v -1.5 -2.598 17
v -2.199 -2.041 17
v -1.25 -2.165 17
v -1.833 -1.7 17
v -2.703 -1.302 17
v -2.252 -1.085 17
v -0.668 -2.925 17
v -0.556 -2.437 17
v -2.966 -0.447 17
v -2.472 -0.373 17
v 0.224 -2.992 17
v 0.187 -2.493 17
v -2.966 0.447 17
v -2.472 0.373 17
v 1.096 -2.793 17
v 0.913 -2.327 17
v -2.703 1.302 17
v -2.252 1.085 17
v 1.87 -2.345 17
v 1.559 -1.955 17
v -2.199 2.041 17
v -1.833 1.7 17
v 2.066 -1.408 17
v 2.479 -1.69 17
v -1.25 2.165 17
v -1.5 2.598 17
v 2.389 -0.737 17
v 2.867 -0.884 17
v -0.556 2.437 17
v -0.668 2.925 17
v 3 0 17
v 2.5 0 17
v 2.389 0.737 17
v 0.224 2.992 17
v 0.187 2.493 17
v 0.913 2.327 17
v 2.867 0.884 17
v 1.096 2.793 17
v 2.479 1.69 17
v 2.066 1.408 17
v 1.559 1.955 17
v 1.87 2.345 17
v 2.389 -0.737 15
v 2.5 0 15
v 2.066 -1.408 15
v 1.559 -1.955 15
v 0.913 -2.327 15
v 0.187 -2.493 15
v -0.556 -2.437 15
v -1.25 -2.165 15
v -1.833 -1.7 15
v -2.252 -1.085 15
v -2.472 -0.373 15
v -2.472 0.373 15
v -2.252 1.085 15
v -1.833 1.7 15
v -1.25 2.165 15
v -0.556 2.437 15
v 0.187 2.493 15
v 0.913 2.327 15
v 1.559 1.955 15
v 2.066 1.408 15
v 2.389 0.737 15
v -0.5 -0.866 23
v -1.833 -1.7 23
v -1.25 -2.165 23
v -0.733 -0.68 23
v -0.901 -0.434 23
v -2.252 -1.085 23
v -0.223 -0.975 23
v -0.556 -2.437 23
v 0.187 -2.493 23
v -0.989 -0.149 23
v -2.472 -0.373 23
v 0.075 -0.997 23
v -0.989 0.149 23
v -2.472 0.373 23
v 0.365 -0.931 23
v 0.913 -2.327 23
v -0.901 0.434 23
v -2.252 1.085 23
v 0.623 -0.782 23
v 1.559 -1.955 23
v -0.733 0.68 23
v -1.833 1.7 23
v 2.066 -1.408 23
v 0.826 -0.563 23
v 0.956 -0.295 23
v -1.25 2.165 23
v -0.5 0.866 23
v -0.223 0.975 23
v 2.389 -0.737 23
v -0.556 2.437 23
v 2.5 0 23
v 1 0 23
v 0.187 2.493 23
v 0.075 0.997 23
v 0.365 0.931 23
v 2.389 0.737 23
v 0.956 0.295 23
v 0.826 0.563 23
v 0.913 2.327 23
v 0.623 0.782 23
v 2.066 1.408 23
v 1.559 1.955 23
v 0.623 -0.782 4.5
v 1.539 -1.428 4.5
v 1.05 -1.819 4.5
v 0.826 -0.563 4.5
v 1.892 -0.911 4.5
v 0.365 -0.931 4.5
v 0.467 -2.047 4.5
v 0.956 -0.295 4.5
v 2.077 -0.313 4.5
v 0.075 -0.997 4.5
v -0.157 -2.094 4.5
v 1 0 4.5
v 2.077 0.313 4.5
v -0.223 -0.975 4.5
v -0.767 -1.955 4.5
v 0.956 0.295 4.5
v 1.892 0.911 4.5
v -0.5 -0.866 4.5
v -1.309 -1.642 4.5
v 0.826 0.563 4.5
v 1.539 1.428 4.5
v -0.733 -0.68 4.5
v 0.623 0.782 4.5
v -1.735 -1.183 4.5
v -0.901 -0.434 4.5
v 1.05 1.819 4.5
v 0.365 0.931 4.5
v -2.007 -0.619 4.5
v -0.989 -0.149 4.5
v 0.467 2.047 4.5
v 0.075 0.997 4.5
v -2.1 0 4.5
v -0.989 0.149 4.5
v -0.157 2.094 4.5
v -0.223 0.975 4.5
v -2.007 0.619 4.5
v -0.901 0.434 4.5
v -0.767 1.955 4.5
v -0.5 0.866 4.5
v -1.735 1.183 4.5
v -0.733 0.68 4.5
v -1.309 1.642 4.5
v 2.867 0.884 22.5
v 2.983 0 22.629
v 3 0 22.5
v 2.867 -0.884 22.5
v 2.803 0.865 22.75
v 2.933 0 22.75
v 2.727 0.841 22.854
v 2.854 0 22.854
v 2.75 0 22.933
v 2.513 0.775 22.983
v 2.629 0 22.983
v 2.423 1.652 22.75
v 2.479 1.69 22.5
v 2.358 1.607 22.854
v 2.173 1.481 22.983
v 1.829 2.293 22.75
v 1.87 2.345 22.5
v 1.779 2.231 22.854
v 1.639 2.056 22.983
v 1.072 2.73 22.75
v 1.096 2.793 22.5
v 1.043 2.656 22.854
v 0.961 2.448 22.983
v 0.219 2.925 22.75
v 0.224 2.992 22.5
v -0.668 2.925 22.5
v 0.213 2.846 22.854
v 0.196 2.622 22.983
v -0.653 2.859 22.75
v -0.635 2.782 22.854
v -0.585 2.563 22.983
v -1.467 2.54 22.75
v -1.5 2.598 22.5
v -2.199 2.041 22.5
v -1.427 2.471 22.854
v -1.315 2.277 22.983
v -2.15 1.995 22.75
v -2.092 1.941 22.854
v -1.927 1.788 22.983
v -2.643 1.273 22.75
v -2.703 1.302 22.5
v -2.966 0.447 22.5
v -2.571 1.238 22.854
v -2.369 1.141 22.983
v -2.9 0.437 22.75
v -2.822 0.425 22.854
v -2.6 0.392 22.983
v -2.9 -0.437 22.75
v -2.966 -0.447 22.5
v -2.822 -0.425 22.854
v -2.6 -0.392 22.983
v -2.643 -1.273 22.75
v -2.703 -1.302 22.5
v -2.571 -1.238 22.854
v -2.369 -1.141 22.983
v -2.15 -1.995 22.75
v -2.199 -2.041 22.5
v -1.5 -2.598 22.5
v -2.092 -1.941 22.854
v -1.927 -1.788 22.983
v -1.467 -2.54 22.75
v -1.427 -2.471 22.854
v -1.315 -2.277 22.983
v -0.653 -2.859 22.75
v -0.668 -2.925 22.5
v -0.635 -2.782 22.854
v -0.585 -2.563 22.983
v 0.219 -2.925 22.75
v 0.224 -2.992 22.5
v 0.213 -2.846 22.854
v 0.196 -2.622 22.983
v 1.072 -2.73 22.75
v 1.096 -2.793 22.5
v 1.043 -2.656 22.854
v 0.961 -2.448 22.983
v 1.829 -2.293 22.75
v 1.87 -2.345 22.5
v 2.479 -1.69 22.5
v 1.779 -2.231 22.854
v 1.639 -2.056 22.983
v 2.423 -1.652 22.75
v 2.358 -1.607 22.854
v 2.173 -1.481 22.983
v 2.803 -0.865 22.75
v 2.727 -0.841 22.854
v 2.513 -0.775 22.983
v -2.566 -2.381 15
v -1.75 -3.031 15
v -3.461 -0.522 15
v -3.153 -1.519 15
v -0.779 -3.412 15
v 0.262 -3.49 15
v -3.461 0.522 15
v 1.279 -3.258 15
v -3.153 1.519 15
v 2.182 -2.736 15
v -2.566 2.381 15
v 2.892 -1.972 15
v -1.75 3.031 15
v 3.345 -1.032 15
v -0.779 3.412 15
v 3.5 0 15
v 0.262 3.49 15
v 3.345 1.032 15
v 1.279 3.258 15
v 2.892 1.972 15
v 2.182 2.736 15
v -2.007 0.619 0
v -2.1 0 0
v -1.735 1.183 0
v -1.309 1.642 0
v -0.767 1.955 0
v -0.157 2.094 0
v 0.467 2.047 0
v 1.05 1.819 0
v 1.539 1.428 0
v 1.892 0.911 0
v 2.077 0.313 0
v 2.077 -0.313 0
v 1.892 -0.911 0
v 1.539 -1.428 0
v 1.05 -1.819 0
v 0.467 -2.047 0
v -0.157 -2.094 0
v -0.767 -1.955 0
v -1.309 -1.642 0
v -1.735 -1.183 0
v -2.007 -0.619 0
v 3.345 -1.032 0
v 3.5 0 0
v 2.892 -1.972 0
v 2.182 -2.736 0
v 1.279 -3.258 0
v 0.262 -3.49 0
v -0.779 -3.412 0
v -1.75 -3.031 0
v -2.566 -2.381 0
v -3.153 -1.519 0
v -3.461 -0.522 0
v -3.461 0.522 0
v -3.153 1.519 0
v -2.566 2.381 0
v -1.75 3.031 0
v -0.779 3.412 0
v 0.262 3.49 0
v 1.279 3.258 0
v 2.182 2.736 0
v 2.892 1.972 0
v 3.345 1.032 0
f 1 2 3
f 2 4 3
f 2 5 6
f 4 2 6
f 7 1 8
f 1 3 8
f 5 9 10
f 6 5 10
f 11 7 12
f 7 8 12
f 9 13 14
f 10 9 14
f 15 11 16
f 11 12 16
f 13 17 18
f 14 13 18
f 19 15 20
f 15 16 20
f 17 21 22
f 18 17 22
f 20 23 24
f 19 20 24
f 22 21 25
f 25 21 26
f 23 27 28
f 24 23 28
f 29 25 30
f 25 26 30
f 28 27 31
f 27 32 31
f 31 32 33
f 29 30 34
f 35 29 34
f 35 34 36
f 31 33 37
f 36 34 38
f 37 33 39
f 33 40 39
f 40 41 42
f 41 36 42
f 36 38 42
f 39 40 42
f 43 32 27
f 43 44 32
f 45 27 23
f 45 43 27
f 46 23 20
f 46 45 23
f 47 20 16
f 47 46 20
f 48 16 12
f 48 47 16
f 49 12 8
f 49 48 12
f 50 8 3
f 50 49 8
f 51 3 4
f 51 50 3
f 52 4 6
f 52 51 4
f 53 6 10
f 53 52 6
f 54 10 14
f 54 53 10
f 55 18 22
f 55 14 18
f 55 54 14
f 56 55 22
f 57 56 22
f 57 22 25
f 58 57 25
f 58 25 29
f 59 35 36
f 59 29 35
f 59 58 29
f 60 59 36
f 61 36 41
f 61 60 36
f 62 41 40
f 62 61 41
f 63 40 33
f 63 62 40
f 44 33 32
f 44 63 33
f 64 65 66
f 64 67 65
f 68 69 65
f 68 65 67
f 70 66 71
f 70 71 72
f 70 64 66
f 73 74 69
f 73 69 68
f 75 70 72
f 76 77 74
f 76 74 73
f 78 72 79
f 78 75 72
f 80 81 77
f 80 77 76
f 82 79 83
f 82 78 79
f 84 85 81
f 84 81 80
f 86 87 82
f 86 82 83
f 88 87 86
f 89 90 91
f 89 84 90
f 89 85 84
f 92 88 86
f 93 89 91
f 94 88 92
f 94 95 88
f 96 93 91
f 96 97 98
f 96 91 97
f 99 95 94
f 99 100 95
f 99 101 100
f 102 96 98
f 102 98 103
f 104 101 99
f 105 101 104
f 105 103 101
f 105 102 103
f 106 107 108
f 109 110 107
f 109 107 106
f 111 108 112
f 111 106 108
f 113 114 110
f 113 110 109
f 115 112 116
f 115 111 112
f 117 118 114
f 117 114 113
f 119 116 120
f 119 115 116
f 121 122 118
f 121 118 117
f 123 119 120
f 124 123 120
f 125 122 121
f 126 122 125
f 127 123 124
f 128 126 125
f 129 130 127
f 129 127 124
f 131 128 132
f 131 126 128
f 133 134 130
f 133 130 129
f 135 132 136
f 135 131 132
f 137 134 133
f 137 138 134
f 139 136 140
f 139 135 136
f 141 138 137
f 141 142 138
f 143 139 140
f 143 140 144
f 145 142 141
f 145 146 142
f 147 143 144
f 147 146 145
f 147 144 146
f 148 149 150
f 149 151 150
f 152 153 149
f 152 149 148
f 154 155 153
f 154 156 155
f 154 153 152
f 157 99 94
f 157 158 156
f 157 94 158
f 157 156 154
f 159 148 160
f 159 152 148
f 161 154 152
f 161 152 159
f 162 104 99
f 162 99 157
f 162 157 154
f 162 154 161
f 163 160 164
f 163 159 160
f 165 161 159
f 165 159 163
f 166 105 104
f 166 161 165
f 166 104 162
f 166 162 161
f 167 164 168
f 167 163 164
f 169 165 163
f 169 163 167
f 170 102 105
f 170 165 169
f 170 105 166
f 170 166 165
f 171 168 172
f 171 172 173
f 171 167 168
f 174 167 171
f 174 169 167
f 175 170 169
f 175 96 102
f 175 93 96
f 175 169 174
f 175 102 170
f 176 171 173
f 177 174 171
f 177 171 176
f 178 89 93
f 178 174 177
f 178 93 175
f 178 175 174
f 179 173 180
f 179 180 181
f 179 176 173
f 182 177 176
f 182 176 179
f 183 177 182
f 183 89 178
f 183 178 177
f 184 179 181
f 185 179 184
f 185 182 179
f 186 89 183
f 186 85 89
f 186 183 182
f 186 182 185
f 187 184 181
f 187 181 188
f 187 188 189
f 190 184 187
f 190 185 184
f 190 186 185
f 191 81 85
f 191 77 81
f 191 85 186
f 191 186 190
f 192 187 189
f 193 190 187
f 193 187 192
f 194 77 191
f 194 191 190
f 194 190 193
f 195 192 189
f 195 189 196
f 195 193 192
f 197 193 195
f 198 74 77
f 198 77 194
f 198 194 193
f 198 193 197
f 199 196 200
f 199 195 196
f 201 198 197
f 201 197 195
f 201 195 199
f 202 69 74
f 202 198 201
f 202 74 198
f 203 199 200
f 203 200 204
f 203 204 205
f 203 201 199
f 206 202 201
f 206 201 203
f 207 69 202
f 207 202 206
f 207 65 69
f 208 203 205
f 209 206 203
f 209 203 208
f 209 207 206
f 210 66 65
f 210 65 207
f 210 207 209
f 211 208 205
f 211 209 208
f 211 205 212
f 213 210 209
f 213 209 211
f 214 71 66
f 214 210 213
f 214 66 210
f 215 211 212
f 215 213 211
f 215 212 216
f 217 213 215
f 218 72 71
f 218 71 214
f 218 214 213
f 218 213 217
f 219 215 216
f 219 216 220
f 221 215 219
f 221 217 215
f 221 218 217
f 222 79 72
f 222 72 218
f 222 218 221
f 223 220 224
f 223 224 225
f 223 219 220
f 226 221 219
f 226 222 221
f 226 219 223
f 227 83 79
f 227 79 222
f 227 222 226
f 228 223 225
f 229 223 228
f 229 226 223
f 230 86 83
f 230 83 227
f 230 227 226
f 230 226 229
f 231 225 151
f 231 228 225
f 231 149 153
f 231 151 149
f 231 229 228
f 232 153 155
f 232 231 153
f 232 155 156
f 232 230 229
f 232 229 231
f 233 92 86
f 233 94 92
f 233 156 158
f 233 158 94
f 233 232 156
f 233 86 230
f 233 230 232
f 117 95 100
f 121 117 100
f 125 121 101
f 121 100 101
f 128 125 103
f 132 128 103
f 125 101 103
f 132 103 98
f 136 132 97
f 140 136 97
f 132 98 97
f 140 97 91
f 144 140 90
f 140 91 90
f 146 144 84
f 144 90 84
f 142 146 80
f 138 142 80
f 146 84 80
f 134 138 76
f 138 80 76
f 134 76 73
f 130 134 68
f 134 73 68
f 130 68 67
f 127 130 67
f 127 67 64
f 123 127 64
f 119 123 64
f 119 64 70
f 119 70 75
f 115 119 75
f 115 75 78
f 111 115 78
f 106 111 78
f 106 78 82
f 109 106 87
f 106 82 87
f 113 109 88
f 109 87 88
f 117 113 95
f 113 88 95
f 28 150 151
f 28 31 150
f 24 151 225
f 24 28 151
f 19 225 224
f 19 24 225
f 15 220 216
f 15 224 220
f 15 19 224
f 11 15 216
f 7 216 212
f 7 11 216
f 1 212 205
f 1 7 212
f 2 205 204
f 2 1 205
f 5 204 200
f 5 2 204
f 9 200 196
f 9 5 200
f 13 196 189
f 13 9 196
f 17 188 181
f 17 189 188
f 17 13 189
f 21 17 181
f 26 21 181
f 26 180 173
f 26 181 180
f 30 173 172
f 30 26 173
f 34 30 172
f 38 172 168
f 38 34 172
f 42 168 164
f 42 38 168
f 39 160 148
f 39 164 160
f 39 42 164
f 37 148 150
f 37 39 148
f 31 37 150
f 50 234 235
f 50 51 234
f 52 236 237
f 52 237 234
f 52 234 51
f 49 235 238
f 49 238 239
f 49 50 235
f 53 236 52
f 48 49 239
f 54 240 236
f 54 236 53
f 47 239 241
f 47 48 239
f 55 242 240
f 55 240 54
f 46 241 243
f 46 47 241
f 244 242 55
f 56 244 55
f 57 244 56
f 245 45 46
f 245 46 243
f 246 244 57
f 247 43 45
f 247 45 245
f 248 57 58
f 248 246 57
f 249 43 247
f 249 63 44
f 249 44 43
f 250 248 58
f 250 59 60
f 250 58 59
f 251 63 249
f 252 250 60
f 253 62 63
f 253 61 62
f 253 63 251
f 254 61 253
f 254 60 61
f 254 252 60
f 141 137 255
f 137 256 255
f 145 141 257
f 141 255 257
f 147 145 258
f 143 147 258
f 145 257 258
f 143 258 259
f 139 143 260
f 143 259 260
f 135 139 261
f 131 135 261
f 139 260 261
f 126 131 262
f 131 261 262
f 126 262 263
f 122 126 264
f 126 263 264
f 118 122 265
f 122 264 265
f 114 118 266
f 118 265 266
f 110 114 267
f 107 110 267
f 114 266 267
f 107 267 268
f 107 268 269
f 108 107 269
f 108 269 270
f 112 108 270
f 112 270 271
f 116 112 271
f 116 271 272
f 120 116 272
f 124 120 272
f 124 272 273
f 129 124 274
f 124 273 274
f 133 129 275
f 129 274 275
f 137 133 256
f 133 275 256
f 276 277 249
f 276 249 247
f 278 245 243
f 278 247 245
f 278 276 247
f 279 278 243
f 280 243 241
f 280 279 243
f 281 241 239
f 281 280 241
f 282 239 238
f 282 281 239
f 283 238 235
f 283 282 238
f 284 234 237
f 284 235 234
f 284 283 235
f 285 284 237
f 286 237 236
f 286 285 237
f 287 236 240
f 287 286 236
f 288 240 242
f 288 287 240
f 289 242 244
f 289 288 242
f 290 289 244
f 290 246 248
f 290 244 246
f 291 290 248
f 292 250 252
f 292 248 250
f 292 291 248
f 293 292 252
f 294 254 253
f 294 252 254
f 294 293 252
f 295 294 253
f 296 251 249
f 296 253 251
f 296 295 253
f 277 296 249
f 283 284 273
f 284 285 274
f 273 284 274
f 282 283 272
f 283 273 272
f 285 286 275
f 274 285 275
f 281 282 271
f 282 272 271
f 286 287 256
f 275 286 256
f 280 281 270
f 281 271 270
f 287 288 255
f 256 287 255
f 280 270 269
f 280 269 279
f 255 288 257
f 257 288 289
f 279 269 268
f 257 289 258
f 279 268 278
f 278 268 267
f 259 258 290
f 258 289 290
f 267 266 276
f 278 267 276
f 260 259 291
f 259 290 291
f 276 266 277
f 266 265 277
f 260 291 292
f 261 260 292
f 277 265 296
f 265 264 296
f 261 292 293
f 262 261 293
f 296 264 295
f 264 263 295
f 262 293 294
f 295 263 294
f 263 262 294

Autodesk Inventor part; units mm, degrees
ref_plane "YZ Plane" through (0, 0, 0) normal (1, 0, 0) x (0, 1, 0)
ref_plane "XZ Plane" through (0, 0, 0) normal (0, 1, 0) x (-1, 0, 0)
ref_plane "XY Plane" through (0, 0, 0) normal (0, 0, 1) x (1, 0, 0)
sketch "Sketch1" plane through (0, 0, 0) normal (0, 0, 1) x (1, 0, 0)
  circle A0 centre (0, 0) radius 3.5
  dimension "d0" = 7
extrude "Extrusion1" add sketch "Sketch1" along normal blind 15
sketch "Sketch2" plane through (0, 0, 15) normal (0, 0, 1) x (1, 0, 0)
  circle A0 centre (0, 0) radius 2.5
  dimension "d3" = 5
extrude "Extrusion2" add sketch "Sketch2" along normal blind 2
sketch "Sketch3" plane through (0, 0, 17) normal (0, 0, 1) x (1, 0, 0)
  circle A0 centre (0, 0) radius 3
  dimension "d6" = 6
extrude "Extrusion3" add sketch "Sketch3" along normal blind 6
sketch "Sketch4" plane through (0, 0, 23) normal (0, 0, 1) x (1, 0, 0)
  circle A0 centre (0, 0) radius 1
  dimension "d9" = 2
extrude "Extrusion4" cut sketch "Sketch4" against normal through all
thread "Thread1" size "M6x1" class "6g" standard "ANSI Metric M Profile" full length
fillet "Fillet1" radius 0.5 1 edges at (-3, 0, 23)
sketch "Sketch5" plane through (0, 0, 0) normal (0, 0, -1) x (-1, 0, 0)
  circle A0 centre (0, 0) radius 2.1
  dimension "d15" = 4.2
extrude "Extrusion5" cut sketch "Sketch5" against normal blind 4.5
properties part number "nozzle throat" material "Stainless Steel"
